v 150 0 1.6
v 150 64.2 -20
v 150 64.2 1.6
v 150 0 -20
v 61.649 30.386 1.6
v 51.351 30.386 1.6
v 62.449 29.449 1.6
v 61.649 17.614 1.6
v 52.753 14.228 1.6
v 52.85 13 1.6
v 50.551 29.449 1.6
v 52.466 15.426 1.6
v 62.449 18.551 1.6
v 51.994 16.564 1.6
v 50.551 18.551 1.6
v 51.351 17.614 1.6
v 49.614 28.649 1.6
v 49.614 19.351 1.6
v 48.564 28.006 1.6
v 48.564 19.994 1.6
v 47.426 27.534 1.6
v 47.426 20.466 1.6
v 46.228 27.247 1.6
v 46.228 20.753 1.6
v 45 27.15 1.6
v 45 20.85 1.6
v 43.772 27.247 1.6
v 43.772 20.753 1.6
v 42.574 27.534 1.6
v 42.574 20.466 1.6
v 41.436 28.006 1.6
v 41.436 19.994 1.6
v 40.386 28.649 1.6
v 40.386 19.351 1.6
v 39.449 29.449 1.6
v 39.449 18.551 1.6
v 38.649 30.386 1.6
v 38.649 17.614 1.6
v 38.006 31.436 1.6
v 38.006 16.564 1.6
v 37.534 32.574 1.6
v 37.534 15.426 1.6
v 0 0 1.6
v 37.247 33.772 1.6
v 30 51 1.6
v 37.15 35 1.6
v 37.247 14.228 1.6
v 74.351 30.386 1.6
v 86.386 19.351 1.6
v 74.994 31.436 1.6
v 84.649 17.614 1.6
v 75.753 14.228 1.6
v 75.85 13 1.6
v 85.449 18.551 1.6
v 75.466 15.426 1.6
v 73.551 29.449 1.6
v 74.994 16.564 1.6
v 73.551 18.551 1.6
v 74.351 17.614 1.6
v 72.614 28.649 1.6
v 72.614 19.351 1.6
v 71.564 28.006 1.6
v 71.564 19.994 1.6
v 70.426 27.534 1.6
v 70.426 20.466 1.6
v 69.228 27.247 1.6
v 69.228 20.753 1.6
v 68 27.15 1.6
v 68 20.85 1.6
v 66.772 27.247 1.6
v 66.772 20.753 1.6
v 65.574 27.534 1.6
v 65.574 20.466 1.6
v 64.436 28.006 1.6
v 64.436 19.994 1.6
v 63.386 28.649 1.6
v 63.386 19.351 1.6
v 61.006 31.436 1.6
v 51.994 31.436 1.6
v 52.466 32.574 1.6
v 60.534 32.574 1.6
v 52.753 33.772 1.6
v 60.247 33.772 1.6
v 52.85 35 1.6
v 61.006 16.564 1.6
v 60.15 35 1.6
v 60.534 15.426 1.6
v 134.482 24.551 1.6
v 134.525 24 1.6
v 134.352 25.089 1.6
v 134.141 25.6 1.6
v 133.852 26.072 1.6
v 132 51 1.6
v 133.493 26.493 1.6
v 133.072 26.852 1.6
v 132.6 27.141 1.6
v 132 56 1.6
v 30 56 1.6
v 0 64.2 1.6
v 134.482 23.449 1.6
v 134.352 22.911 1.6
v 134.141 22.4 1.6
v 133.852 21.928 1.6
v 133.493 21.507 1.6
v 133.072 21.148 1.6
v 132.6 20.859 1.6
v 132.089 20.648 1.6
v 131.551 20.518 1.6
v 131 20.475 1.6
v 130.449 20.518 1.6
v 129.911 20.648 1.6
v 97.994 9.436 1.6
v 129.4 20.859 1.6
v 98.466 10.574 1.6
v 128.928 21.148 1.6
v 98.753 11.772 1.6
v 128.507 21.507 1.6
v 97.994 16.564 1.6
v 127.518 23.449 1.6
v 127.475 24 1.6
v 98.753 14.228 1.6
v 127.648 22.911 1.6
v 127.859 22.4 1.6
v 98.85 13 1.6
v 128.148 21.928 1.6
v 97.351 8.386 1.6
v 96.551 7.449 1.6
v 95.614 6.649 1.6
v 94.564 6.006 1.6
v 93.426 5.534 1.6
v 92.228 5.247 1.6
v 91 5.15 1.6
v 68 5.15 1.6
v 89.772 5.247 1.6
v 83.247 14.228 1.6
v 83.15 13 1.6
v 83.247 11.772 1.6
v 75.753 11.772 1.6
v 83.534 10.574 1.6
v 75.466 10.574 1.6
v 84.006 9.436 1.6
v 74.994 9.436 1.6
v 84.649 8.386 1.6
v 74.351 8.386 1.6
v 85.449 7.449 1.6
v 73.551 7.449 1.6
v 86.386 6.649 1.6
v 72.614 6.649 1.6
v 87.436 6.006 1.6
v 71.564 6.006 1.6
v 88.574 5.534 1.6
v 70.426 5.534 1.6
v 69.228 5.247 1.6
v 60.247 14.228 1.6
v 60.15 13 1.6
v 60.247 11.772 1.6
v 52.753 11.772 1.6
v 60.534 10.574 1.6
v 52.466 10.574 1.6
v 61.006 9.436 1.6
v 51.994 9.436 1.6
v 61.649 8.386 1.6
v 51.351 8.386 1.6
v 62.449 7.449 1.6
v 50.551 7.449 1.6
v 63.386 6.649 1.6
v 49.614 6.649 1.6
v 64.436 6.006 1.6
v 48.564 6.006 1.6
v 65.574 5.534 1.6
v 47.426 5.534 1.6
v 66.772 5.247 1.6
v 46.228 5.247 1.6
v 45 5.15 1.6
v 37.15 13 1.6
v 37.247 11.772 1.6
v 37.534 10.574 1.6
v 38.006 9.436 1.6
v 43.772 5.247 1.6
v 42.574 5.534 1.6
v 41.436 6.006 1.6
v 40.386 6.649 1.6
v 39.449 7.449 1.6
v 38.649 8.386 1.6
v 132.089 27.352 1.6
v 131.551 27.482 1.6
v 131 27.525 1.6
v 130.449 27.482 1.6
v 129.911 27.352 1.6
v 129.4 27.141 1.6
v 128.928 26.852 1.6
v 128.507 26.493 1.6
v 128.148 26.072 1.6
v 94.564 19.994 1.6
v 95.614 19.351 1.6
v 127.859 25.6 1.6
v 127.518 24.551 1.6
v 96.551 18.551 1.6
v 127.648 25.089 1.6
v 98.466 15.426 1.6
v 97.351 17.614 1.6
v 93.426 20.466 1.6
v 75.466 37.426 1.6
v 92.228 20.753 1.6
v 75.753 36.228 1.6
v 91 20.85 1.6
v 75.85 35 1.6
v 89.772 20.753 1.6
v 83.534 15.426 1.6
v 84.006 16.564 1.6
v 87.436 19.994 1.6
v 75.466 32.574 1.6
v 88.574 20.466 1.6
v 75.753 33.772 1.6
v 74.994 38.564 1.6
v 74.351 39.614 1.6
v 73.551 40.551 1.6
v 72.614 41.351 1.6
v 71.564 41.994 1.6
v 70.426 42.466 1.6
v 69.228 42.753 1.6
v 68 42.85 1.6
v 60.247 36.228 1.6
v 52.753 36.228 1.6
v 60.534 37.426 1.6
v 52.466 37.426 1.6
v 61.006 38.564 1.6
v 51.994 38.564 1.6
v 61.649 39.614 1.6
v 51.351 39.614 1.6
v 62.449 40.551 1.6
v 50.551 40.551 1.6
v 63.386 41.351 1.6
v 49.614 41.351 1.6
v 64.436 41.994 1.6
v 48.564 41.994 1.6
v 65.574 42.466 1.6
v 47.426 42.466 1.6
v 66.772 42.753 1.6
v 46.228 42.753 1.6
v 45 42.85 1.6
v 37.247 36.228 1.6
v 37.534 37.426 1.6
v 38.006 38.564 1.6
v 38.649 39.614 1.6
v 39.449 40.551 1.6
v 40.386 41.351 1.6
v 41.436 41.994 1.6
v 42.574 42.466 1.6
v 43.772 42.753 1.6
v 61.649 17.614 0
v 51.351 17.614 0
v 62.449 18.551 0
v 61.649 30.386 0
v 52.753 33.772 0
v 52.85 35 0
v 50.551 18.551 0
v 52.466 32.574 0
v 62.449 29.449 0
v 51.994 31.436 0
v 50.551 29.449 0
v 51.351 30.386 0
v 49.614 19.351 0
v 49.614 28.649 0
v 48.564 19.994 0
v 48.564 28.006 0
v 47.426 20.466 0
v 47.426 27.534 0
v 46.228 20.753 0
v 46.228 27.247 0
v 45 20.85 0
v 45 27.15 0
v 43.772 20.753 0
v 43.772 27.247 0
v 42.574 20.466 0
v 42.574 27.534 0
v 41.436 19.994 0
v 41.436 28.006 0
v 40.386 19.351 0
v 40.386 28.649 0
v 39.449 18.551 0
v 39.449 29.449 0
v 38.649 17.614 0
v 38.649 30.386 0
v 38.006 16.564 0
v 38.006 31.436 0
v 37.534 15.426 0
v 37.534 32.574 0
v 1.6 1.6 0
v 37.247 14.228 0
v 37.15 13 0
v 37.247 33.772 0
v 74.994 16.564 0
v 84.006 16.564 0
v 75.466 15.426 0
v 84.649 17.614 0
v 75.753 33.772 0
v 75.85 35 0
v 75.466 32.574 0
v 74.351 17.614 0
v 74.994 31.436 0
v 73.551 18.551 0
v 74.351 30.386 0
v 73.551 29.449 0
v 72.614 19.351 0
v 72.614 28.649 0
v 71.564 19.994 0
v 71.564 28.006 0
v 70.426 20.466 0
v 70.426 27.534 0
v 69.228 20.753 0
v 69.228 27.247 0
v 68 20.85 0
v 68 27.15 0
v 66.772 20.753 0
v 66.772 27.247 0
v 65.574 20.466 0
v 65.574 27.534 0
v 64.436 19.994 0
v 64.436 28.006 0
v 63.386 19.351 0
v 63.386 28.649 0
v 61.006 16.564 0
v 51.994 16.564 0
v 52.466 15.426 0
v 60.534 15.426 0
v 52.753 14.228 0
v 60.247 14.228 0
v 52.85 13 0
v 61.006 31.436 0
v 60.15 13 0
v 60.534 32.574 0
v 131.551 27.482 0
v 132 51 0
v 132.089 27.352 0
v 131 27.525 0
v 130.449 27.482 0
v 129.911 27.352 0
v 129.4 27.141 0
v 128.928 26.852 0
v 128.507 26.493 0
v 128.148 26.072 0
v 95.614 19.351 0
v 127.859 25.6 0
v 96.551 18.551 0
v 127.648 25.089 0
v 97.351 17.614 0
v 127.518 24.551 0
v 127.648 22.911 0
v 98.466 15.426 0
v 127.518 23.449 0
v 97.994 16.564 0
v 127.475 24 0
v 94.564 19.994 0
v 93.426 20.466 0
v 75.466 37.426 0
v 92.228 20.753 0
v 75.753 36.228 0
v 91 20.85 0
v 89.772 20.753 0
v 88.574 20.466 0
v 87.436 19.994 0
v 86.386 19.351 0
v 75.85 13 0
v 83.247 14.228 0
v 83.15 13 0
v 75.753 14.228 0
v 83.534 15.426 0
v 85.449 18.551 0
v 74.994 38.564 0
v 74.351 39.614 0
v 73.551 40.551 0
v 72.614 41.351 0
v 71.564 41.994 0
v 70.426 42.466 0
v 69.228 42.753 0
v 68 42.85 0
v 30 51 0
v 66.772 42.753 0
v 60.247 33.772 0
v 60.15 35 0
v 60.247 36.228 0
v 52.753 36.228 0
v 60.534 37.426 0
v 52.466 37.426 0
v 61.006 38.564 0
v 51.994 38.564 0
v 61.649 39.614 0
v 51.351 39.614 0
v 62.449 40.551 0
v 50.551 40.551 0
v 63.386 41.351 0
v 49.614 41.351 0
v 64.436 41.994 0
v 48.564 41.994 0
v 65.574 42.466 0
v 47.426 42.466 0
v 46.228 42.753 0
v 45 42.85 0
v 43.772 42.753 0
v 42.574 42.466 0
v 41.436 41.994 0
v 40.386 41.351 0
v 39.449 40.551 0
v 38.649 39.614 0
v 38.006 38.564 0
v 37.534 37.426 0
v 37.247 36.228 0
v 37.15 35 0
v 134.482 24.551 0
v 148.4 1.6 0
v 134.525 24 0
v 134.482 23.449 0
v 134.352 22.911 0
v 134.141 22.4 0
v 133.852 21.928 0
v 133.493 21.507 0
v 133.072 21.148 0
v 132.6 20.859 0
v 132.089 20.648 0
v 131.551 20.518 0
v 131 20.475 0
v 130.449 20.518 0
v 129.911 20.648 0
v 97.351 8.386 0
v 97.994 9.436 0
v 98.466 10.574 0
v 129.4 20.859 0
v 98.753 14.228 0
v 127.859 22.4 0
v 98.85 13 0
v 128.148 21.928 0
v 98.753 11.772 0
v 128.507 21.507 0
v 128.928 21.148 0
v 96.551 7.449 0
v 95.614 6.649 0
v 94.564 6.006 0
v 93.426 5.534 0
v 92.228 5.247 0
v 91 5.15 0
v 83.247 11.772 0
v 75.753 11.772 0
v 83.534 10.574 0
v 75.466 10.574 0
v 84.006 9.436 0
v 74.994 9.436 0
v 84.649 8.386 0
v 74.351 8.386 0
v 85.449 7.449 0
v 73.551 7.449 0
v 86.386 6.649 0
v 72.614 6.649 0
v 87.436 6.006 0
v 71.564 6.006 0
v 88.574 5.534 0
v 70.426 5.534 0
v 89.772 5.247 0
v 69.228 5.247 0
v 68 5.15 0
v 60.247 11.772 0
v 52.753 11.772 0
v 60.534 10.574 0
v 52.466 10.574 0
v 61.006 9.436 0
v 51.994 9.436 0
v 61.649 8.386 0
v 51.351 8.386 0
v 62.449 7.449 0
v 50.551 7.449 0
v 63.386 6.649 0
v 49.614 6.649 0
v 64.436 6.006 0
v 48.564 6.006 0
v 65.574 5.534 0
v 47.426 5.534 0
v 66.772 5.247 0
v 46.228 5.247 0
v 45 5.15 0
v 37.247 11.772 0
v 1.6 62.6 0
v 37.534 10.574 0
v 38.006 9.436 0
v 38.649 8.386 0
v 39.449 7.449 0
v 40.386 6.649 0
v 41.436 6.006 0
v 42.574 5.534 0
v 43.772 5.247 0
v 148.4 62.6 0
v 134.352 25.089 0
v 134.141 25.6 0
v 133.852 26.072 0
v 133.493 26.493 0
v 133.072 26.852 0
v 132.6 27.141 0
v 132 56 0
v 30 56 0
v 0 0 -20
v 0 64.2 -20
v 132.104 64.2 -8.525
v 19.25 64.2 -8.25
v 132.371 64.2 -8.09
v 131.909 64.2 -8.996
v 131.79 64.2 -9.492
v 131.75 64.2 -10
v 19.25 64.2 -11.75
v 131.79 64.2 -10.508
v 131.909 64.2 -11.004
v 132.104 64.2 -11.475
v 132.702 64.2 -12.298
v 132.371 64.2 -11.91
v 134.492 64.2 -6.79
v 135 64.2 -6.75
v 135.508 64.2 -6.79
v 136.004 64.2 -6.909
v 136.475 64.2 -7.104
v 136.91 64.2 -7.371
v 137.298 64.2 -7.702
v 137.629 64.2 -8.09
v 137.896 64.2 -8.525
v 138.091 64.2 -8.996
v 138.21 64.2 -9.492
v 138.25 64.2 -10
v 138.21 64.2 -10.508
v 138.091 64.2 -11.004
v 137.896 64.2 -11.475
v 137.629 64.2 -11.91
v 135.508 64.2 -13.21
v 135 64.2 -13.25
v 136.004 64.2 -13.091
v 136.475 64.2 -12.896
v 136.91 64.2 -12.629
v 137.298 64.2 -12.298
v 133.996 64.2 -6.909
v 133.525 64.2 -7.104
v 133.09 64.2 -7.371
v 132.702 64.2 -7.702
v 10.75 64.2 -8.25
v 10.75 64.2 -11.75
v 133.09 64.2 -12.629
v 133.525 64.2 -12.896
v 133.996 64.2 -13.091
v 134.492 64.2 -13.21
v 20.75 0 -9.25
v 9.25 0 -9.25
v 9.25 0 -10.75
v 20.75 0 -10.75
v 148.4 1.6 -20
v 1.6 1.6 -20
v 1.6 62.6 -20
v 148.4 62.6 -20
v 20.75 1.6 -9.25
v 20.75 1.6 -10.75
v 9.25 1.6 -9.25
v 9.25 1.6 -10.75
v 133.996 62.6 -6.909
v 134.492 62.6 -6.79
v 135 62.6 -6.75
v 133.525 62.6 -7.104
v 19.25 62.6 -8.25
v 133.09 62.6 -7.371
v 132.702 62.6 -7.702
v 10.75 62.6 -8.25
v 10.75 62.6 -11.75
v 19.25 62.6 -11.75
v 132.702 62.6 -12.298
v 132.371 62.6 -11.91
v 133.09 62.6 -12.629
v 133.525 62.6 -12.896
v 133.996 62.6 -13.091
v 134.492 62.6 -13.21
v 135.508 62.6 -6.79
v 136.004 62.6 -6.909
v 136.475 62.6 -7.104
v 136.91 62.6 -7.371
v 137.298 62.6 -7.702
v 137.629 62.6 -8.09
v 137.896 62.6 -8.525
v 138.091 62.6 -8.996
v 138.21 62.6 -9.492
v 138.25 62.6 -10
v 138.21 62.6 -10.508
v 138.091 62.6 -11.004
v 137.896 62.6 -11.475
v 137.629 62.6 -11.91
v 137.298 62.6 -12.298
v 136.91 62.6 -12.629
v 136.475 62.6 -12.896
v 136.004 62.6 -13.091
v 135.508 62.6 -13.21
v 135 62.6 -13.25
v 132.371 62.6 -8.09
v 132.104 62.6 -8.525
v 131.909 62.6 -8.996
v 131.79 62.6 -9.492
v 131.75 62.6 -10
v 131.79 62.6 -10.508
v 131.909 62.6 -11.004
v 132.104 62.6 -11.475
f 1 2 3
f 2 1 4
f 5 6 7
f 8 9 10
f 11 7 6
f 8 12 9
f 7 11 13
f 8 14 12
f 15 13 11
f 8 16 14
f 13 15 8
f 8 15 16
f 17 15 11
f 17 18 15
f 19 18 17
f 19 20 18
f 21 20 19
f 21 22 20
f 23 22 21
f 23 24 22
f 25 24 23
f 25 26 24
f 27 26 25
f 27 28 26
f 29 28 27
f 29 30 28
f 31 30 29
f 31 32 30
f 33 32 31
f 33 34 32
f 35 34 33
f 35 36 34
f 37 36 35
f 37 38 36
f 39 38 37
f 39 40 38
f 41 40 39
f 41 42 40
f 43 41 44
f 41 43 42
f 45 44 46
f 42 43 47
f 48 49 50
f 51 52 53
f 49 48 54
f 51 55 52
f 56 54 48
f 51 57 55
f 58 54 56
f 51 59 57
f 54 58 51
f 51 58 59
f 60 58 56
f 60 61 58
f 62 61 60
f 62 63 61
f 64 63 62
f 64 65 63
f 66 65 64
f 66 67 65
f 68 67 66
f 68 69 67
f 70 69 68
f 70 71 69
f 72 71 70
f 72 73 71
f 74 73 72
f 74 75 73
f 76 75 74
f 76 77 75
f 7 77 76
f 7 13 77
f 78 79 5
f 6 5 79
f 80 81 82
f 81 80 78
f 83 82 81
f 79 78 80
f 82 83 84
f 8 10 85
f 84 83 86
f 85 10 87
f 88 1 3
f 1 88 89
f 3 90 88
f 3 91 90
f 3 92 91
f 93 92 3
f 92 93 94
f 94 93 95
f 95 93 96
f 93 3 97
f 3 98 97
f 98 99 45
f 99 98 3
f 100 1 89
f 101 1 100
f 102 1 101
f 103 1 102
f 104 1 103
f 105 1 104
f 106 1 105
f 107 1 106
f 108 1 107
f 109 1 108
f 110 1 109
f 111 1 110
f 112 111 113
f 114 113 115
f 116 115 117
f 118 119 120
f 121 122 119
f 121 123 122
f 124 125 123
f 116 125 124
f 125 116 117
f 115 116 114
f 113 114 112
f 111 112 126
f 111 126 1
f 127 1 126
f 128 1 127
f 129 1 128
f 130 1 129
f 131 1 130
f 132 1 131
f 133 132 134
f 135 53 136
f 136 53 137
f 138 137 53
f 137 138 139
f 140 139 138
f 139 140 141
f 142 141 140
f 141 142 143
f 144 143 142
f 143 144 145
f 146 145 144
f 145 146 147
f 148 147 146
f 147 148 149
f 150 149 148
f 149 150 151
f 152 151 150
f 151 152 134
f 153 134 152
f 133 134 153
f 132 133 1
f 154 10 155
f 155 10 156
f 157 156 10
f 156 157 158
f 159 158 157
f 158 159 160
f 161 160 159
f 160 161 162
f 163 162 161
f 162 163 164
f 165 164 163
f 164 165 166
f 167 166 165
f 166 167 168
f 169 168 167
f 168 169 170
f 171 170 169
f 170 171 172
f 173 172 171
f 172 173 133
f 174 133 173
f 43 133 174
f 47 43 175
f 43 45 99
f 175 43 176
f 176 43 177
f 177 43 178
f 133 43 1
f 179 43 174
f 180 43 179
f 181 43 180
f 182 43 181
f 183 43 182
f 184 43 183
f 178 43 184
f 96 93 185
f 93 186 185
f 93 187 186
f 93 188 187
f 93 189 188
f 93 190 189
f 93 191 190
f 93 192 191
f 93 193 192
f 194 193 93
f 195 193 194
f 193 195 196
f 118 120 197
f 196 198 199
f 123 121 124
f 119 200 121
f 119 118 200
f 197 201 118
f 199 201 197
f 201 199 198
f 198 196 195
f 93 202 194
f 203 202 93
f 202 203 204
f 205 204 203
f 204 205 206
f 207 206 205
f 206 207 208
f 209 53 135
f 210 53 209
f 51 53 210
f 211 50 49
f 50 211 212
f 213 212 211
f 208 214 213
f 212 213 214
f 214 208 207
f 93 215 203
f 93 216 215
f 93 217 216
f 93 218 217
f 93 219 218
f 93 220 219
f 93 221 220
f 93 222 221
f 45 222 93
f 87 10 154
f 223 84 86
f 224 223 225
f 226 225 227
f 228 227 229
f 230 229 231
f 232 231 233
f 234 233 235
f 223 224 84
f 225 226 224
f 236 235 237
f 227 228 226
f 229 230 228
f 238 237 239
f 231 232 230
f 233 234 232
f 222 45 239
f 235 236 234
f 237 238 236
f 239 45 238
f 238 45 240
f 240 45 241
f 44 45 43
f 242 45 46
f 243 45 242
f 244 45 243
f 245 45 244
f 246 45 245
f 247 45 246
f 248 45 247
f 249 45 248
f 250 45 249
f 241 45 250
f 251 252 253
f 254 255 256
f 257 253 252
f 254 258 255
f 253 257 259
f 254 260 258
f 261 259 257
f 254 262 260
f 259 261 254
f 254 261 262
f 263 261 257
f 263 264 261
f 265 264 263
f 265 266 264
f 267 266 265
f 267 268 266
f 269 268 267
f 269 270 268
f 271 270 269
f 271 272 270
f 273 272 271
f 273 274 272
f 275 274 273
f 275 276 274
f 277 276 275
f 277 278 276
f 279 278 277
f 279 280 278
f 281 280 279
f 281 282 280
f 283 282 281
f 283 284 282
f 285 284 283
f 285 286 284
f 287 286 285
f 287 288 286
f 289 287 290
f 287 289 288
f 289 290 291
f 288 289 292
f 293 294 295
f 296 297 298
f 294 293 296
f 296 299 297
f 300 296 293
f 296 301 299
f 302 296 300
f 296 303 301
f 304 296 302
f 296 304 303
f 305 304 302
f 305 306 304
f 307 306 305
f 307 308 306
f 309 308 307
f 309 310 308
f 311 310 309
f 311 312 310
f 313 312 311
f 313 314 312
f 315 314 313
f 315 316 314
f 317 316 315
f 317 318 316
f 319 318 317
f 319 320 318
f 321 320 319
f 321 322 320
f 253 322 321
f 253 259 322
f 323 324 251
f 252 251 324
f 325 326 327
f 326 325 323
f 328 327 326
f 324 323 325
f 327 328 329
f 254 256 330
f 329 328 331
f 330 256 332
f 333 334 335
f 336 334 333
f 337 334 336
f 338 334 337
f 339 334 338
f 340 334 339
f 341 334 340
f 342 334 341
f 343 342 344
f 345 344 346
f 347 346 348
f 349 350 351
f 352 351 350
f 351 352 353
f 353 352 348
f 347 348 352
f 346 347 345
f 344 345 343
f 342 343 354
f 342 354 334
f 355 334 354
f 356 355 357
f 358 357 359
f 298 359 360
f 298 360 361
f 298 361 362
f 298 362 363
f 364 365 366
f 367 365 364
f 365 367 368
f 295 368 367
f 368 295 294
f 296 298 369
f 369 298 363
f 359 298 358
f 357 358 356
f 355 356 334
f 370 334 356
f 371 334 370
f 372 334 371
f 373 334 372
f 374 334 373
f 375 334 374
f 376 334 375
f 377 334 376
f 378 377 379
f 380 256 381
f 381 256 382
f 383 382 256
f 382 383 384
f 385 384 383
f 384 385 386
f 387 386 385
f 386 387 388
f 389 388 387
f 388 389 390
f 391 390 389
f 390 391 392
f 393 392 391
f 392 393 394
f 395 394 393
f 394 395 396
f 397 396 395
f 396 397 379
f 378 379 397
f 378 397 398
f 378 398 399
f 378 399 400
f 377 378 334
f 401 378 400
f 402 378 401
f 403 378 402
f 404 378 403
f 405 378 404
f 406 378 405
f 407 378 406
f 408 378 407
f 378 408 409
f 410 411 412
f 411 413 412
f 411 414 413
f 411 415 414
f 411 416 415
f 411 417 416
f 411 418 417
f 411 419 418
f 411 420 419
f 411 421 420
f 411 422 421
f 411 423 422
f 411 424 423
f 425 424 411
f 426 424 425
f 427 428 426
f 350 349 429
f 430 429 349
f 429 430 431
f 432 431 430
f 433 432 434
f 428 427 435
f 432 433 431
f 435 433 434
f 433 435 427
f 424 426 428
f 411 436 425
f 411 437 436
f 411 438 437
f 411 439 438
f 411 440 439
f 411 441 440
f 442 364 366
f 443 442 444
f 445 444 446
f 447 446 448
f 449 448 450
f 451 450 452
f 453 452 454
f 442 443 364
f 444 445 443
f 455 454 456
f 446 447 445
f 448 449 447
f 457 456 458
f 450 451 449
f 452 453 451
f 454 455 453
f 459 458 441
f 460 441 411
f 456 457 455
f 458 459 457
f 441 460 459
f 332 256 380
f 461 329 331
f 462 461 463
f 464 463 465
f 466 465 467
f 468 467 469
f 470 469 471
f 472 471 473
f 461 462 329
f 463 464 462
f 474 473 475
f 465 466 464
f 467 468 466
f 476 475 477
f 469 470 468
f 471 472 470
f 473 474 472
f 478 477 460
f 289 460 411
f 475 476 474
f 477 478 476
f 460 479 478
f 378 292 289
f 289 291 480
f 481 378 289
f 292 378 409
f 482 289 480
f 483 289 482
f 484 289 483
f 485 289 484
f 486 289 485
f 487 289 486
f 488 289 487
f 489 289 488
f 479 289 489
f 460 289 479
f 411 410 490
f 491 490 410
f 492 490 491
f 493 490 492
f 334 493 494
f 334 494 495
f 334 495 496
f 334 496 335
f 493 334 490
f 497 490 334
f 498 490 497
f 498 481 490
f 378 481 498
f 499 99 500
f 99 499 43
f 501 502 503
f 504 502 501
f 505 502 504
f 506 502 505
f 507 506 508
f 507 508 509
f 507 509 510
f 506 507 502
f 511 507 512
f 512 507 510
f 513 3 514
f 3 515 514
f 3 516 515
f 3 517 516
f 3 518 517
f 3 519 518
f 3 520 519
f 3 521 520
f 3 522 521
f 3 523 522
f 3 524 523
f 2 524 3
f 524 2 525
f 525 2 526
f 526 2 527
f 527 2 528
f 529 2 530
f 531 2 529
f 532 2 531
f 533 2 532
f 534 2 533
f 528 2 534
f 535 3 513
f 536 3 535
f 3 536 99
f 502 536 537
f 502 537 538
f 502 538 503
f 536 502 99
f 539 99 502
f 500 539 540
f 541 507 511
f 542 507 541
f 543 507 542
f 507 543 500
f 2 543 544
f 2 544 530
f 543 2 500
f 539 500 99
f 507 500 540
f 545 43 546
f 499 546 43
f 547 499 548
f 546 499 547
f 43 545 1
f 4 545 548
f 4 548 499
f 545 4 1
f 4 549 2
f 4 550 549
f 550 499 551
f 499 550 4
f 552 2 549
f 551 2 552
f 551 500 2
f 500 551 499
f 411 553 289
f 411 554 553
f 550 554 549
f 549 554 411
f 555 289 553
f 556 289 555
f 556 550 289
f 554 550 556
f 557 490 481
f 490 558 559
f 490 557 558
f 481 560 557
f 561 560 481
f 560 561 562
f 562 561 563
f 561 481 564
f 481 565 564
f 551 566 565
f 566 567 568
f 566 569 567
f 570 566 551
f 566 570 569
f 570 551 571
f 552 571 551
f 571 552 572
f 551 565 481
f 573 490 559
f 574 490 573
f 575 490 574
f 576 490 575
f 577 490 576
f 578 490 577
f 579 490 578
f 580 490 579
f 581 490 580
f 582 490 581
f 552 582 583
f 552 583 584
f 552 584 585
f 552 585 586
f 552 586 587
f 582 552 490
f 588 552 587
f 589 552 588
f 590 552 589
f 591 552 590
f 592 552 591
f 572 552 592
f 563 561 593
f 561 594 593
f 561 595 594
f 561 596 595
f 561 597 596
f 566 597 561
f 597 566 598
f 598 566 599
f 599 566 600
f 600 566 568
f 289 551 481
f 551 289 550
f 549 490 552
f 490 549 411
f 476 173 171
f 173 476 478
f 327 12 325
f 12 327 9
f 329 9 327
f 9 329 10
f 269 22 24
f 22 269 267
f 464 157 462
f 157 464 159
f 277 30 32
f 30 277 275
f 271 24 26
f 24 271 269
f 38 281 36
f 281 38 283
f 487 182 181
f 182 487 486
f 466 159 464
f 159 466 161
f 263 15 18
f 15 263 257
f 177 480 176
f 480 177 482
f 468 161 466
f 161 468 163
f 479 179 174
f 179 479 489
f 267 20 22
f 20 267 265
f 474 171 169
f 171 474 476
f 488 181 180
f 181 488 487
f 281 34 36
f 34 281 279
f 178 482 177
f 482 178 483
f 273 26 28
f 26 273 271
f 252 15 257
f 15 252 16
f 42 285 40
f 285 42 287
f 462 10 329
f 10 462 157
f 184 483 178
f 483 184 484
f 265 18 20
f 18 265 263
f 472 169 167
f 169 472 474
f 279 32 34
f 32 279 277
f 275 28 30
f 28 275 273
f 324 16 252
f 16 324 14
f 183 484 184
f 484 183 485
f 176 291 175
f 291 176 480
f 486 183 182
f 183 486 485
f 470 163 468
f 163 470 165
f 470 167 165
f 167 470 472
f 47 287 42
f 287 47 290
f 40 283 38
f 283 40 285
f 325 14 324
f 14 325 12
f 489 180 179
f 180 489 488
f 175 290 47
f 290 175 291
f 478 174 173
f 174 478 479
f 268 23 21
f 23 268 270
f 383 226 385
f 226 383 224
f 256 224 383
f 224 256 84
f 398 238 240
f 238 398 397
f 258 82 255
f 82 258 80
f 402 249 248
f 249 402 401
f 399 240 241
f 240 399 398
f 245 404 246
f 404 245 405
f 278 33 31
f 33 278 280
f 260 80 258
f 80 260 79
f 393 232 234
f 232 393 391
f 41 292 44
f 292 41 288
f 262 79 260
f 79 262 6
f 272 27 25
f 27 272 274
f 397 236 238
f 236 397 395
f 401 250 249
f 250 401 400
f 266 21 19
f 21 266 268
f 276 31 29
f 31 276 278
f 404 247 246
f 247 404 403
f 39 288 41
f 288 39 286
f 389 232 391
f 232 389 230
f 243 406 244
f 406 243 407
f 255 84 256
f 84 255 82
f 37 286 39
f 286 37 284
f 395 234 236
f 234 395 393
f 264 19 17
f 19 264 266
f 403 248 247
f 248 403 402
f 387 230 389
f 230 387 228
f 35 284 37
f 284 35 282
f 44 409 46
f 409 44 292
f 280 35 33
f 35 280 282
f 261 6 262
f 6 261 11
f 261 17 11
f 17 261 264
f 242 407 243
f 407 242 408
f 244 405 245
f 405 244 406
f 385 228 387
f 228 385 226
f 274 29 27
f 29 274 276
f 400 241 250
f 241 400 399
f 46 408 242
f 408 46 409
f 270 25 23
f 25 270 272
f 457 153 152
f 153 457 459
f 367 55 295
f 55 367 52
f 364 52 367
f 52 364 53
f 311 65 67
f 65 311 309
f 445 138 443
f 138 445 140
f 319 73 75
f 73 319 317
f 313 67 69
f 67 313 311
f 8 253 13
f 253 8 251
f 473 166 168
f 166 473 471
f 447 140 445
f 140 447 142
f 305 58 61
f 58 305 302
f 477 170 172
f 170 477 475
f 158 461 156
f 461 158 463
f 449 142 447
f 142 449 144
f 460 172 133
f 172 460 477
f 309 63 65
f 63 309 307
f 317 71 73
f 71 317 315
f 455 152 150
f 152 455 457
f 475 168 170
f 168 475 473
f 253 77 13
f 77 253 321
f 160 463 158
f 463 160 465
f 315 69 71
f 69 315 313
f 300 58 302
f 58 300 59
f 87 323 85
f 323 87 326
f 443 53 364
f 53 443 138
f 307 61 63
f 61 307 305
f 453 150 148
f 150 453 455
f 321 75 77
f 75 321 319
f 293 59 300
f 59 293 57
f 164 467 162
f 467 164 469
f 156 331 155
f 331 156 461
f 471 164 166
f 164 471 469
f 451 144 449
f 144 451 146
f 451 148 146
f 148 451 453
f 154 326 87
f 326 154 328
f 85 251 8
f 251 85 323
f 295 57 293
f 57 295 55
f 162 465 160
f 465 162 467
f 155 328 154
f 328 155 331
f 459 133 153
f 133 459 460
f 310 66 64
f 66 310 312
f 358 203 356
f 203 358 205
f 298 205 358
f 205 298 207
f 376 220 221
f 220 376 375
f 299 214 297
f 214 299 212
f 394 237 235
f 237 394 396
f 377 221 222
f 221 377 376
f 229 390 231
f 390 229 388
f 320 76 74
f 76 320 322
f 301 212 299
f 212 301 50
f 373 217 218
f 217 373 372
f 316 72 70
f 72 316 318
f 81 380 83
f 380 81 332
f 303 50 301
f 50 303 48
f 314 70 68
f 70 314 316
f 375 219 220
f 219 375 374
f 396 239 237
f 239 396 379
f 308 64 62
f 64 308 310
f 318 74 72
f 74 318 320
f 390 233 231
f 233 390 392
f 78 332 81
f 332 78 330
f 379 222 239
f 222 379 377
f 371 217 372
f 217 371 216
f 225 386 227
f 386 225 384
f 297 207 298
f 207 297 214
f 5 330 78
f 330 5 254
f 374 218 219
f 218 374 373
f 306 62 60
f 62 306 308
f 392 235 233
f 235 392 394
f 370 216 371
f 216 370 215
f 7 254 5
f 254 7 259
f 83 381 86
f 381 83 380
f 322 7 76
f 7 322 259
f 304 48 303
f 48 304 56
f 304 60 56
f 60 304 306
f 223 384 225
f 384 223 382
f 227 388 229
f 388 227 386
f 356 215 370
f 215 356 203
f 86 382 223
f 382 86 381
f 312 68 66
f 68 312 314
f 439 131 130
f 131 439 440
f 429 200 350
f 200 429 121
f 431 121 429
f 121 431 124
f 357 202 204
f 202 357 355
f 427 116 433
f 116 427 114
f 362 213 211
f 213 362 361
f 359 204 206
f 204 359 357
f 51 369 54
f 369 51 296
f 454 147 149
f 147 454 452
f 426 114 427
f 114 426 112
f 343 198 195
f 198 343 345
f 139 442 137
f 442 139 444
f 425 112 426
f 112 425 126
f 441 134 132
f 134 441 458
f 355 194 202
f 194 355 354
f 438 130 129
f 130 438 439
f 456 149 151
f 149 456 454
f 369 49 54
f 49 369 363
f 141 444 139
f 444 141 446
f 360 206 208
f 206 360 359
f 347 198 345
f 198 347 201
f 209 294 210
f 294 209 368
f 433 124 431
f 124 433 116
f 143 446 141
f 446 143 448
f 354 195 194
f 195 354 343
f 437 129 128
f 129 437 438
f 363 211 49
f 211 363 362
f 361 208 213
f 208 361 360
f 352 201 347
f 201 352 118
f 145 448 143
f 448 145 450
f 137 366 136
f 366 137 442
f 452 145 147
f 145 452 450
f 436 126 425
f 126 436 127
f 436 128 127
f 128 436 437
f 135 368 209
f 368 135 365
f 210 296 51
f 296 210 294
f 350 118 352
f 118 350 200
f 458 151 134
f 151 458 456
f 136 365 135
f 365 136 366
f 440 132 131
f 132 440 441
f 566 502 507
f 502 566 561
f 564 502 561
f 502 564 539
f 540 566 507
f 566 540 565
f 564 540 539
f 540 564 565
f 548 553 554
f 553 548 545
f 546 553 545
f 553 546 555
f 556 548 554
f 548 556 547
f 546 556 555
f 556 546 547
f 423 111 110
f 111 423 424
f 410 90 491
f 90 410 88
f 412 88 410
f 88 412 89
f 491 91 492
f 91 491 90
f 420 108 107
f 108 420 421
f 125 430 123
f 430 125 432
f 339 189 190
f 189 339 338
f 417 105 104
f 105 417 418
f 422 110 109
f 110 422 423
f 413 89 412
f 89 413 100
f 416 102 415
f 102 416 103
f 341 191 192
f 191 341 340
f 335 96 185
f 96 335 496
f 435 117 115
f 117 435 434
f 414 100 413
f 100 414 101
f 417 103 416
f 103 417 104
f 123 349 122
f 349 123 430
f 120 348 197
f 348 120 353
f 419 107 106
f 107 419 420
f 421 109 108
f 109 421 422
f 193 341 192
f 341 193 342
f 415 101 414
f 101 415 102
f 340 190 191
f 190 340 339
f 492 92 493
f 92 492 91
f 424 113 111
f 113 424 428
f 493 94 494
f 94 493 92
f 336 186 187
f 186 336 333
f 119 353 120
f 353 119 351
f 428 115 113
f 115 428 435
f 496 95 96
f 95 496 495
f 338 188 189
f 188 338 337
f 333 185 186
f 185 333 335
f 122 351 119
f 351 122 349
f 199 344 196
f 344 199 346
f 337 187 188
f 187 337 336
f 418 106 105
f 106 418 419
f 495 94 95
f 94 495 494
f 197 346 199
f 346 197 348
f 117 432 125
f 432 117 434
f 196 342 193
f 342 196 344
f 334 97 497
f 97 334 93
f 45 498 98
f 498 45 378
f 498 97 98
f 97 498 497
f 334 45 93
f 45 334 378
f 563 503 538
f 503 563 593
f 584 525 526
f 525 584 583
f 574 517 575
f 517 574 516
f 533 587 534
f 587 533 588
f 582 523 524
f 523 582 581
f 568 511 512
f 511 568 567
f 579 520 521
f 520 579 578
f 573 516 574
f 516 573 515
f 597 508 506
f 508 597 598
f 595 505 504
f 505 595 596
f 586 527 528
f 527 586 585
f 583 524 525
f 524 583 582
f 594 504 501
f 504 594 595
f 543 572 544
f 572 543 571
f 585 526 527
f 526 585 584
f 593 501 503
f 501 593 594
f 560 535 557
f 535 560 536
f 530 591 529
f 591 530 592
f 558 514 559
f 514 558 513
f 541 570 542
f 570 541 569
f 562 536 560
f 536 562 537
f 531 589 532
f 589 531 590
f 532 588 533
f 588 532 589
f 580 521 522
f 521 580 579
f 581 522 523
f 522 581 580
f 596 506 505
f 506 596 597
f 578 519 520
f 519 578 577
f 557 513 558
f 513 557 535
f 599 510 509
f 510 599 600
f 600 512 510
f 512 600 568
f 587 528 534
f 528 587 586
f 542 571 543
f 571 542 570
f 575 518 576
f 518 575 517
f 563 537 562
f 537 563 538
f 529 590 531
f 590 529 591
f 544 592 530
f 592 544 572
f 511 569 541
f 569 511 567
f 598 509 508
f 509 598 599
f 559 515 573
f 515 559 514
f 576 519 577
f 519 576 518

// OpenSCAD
PANEL_THICKNESS = 1.6;
SKIRT_DEPTH = 20;
WIDTH = 150;
INNER_HEIGHT = 61;  // The length of the Teensy board
HEIGHT = INNER_HEIGHT + 2 * PANEL_THICKNESS;

BUTTON_DIAMETER = 15.7;
ENCODER_DIAMETER = 7.05;
HEADPHONE_DIAMETER = 6 + 0.5; // 0.5mm padding

NEOPIXEL_LEFT_END = 30;
NEOPIXEL_TOP_EDGE = 56;

SLOT_CENTERLINE_X = 15;
SLOT_CENTERLINE_DOWN = 10;
USB_PORT_WIDTH = 8 + 0.5; // 0.5mm paddinhg
USB_PORT_HEIGHT = 3 + 0.5; // 0.5mm padding
MICROSD_WIDTH = 11 + 0.5; // 0.5mm padding 
MICROSD_HEIGHT = 1 + 0.5; // 0.5mm padding

$fn=40;

module structure() {
    // front panel
    cube([WIDTH, HEIGHT, PANEL_THICKNESS]);

    // skirt
    translate([0, 0, -SKIRT_DEPTH]) cube([WIDTH, PANEL_THICKNESS, SKIRT_DEPTH]);
    translate([0, HEIGHT - PANEL_THICKNESS, -SKIRT_DEPTH]) cube([WIDTH, PANEL_THICKNESS, SKIRT_DEPTH]);
    translate([0, 0, -SKIRT_DEPTH]) cube([PANEL_THICKNESS, HEIGHT, SKIRT_DEPTH]);
    translate([WIDTH - PANEL_THICKNESS, 0, -SKIRT_DEPTH]) cube([PANEL_THICKNESS, HEIGHT, SKIRT_DEPTH]);
}

module button_hole(x, y) {
    // a hole for the button centered at x,y
    translate([x, y, 0])
    cylinder(h=3*PANEL_THICKNESS, center=true, r=BUTTON_DIAMETER/2);
}

module buttons() {
    // all the holes for the five buttons
    button_hole(45, 13);
    button_hole(45, 35);
    button_hole(68, 13);
    button_hole(68, 35);
    button_hole(91, 13);
}

module neopixels() {
    // neopixel openings
    translate([NEOPIXEL_LEFT_END, NEOPIXEL_TOP_EDGE - 5, -PANEL_THICKNESS])
    cube([102, 5, 3*PANEL_THICKNESS]);
}

module headphones() {
    translate([WIDTH - 15, 50, -SKIRT_DEPTH / 2])
    rotate([-90, 0, 0])
    cylinder(h=100, r=HEADPHONE_DIAMETER/2);
}

module slots() {
    // USB port on top edge
    translate([SLOT_CENTERLINE_X - USB_PORT_WIDTH/2, 50, -SLOT_CENTERLINE_DOWN - USB_PORT_HEIGHT/2])
    cube([USB_PORT_WIDTH, 100, USB_PORT_HEIGHT]);
    
    //MicroSD on bottom edge
    translate([SLOT_CENTERLINE_X - MICROSD_WIDTH/2, -50, -SLOT_CENTERLINE_DOWN - MICROSD_HEIGHT/2])
    cube([MICROSD_WIDTH, 100, MICROSD_HEIGHT]);
}

module case() {
    // drill holes
    difference() {
        structure();
        buttons();
        // encoder
        translate([131, 24, 0]) cylinder(h=3*PANEL_THICKNESS, center=true, r=ENCODER_DIAMETER/2);
        neopixels();
        headphones();
        slots();
    }
}
case();


//TODO
// - Add labels
// - Add back panel
// - Add clips for teensy
// - Add neopixel mount
// - Smooth edges
// - Add studs for screws and recessed 

// encoder button test
//intersection() {
//    case();
//    translate([120, 0, -500]) cube([30, 35, 1000]);
//}

// shave down the neopixel mount STL from Thingiverse
//color("green")
//difference() {
//    import("neopixel_case.stl");
//    translate([-100, -100, 1]) cube([200, 200, 35]);
//}
